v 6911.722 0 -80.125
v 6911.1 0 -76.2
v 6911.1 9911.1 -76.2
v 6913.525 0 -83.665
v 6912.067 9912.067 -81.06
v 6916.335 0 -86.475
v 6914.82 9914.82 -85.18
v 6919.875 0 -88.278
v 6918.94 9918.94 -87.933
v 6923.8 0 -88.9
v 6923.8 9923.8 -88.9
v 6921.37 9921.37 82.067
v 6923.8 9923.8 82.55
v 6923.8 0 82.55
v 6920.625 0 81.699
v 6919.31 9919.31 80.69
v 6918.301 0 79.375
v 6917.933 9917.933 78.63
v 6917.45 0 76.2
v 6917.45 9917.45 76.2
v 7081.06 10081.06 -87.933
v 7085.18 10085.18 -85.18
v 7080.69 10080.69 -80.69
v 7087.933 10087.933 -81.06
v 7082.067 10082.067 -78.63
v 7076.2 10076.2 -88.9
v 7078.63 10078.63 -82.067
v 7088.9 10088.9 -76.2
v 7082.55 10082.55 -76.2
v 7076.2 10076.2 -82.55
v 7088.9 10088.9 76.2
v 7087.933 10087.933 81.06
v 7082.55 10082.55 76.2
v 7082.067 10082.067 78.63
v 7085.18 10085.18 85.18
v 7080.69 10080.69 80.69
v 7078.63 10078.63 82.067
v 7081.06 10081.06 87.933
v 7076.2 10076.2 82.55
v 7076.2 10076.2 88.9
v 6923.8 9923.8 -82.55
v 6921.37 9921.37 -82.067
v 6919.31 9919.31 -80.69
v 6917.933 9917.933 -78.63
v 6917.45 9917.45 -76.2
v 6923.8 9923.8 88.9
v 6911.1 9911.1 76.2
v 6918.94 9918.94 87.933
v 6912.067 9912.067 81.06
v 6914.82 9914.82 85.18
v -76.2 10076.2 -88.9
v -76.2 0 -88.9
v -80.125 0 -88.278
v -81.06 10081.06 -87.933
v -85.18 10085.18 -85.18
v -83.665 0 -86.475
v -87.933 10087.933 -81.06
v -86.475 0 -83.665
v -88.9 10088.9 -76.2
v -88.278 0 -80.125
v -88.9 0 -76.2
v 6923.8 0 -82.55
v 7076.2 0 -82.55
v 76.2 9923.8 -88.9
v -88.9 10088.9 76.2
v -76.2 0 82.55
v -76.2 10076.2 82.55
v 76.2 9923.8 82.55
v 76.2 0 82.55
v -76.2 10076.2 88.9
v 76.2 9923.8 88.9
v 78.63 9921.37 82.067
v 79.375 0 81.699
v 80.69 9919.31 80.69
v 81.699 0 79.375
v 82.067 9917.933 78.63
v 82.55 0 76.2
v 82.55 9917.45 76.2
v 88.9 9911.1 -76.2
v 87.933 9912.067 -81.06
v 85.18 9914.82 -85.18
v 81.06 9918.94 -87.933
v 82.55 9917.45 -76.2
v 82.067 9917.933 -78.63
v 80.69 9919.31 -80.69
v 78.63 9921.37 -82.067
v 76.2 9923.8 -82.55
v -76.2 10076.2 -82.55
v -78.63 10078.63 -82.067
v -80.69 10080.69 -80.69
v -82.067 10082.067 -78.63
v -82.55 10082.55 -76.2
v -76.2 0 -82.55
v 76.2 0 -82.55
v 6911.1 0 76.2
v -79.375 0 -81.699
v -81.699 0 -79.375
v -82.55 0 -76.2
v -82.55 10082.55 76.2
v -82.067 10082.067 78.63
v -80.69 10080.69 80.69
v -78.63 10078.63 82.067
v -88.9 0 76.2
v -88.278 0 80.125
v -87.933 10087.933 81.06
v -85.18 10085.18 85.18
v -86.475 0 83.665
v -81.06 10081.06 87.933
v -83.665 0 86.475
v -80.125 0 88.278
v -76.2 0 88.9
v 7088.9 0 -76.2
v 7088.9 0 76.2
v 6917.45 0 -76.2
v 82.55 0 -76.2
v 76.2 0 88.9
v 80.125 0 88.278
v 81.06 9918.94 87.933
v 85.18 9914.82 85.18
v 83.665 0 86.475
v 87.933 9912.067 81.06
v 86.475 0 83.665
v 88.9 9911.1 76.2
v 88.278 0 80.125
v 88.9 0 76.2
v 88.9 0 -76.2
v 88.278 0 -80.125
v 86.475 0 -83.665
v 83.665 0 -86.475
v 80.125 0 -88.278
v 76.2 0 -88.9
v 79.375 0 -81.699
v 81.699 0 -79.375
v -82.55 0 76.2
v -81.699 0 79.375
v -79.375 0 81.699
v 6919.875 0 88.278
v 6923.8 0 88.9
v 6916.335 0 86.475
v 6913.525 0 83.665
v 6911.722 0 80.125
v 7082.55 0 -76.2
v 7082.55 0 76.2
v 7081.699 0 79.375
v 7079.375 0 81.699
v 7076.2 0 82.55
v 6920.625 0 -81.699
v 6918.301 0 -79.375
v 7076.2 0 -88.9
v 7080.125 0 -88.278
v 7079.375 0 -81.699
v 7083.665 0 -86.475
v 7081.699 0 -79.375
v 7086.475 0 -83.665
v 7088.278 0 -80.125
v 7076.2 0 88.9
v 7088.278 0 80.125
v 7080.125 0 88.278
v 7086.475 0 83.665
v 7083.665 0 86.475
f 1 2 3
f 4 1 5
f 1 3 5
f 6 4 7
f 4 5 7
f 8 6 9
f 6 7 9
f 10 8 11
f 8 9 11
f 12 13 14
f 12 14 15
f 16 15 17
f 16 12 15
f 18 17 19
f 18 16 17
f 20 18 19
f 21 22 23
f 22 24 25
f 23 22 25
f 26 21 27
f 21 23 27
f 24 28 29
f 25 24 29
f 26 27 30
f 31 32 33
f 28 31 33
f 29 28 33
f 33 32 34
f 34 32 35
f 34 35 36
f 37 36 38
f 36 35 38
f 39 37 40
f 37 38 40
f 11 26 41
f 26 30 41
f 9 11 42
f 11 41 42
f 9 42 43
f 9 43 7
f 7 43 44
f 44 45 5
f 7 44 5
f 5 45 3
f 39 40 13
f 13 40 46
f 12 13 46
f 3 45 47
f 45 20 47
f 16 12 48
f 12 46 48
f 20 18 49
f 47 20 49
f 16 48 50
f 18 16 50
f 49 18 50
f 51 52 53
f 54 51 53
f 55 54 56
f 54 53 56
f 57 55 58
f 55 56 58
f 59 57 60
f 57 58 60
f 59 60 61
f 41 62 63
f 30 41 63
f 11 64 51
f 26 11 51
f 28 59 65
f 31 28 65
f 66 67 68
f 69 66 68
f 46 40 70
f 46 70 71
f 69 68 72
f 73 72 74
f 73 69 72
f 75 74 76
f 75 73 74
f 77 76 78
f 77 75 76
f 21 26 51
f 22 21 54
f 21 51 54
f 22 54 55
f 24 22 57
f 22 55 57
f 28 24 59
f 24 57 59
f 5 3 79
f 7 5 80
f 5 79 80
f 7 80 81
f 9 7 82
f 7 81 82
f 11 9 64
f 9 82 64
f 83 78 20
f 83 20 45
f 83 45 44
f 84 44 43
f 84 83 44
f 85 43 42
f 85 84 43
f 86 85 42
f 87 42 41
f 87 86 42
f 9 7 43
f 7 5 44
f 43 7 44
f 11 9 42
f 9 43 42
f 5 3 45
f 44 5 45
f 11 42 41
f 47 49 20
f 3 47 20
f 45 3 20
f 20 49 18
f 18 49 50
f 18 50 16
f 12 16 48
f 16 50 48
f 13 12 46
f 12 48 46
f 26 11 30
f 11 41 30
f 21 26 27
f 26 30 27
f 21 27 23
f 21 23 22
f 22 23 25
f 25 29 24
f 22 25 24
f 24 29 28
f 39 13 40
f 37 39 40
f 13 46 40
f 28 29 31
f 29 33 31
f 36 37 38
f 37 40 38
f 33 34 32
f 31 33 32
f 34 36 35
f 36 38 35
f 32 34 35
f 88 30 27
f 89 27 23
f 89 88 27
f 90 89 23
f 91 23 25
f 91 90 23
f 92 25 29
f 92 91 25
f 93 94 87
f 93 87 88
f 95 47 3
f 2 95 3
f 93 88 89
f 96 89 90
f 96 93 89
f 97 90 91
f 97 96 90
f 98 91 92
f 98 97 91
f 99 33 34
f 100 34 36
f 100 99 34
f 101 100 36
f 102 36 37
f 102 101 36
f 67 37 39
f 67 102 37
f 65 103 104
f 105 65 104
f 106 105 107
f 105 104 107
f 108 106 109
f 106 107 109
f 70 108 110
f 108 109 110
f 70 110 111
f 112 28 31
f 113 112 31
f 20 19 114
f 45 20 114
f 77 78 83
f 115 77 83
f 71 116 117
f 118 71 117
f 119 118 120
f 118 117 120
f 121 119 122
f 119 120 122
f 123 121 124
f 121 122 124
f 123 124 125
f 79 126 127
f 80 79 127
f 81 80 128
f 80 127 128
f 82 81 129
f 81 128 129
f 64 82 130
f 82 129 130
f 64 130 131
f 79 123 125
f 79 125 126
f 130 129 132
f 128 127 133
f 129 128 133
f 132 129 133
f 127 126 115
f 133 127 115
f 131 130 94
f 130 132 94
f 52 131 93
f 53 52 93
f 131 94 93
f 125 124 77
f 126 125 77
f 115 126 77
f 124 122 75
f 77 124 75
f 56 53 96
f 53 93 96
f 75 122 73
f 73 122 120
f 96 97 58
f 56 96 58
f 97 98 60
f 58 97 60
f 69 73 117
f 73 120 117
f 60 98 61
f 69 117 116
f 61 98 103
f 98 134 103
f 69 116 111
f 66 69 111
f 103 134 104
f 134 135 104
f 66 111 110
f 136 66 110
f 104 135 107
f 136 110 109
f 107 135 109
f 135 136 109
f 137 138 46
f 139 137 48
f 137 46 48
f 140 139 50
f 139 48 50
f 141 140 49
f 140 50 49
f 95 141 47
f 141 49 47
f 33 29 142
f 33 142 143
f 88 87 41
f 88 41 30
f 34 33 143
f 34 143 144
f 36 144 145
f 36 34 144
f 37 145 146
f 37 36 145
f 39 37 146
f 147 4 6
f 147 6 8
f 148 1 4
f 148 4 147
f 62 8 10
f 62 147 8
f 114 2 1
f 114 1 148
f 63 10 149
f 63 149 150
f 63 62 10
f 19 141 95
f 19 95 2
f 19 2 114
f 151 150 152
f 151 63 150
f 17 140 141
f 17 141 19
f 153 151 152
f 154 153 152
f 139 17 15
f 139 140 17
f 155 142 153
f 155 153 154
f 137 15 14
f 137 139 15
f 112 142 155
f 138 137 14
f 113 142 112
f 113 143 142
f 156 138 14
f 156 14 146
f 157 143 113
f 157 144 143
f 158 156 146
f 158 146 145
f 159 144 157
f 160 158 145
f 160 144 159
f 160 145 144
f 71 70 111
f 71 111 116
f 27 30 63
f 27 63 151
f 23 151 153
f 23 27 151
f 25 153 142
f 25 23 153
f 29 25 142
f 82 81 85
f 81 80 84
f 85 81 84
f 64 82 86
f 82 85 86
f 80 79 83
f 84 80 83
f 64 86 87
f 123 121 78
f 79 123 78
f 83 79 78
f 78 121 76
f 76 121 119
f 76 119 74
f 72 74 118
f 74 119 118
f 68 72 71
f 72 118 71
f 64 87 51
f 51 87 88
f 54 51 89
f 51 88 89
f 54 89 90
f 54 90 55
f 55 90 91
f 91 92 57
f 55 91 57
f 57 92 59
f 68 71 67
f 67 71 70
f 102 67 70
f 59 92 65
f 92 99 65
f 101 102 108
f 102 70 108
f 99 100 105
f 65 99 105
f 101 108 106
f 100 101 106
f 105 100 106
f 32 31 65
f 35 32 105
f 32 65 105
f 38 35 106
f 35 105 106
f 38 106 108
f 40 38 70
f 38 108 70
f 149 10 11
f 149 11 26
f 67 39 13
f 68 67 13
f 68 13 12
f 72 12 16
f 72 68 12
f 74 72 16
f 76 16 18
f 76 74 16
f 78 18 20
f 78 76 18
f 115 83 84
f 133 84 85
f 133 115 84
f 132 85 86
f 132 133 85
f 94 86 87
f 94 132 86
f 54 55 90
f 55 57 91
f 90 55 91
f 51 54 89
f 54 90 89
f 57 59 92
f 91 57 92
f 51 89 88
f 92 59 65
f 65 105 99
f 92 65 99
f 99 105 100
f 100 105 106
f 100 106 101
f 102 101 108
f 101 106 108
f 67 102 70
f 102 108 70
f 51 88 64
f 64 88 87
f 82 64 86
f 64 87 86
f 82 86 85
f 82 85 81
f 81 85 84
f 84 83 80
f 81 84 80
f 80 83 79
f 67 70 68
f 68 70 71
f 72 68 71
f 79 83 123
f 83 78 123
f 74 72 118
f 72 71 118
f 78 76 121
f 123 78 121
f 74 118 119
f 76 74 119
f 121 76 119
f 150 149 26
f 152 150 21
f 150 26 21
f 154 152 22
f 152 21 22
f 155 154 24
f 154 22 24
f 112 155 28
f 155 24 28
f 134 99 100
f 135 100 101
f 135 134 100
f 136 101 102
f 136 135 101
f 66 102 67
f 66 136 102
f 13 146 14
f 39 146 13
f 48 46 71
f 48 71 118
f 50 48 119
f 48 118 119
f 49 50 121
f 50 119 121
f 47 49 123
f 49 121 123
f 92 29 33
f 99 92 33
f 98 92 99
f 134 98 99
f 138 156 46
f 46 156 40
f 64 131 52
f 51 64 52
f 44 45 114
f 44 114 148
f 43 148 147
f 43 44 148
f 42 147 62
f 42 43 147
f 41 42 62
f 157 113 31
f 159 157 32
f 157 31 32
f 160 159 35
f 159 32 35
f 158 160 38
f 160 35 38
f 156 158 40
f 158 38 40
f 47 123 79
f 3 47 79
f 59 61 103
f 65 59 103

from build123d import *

# Parameters (mm, degrees)
TUBE_SQUARE_TS7X7X0_25_1_DEPTH   = 10126.723585695
TUBE_SQUARE_TS7X7X0_25_1_2_DEPTH = 7253.44717139
TUBE_SQUARE_TS7X7X0_25_1_3_DEPTH = 10126.723585696


with BuildPart() as part:
    # Sketch11 → Tube square TS7X7X0.25(1) (new body)
    with BuildSketch(Plane(origin=(0, 0, 0), x_dir=(-1, 0, 0), z_dir=(0, 1, 0))):
        with BuildLine():
            Line((-76.2, -88.9), (76.2, -88.9))
            ThreePointArc((76.2, -88.9), (85.180256121, -85.180256121), (88.9, -76.2))
            Line((88.9, -76.2), (88.9, 76.2))
            ThreePointArc((88.9, 76.2), (85.180256121, 85.180256121), (76.2, 88.9))
            Line((76.2, 88.9), (-76.2, 88.9))
            ThreePointArc((-76.2, 88.9), (-85.180256121, 85.180256121), (-88.9, 76.2))
            Line((-88.9, 76.2), (-88.9, -76.2))
            ThreePointArc((-88.9, -76.2), (-85.180256121, -85.180256121), (-76.2, -88.9))
        make_face()
        with BuildLine():
            Line((-76.2, -82.55), (76.2, -82.55))
            ThreePointArc((76.2, -82.55), (80.690128061, -80.690128061), (82.55, -76.2))
            Line((82.55, -76.2), (82.55, 76.2))
            ThreePointArc((82.55, 76.2), (80.690128061, 80.690128061), (76.2, 82.55))
            Line((76.2, 82.55), (-76.2, 82.55))
            ThreePointArc((-76.2, 82.55), (-80.690128061, 80.690128061), (-82.55, 76.2))
            Line((-82.55, 76.2), (-82.55, -76.2))
            ThreePointArc((-82.55, -76.2), (-80.690128061, -80.690128061), (-76.2, -82.55))
        make_face(mode=Mode.SUBTRACT)
    extrude(amount=TUBE_SQUARE_TS7X7X0_25_1_DEPTH)

    # Tube square TS7X7X0.25(1) mitre 1
    split(bisect_by=Plane(origin=(0, 10000, 0), x_dir=(0.707106781, -0.707106781, 0), z_dir=(-0.707106781, -0.707106781, 0)), keep=Keep.TOP)


with BuildPart() as body_2:
    # Sketch11 on segment 2 (carried to segment 2) → Tube square TS7X7X0.25_1 2 (new body)
    with BuildSketch(Plane(origin=(-126.723585695, 10000, 0), x_dir=(0, 1, 0), z_dir=(1, 0, 0))):
        with BuildLine():
            Line((-76.2, -88.9), (76.2, -88.9))
            ThreePointArc((76.2, -88.9), (85.180256121, -85.180256121), (88.9, -76.2))
            Line((88.9, -76.2), (88.9, 76.2))
            ThreePointArc((88.9, 76.2), (85.180256121, 85.180256121), (76.2, 88.9))
            Line((76.2, 88.9), (-76.2, 88.9))
            ThreePointArc((-76.2, 88.9), (-85.180256121, 85.180256121), (-88.9, 76.2))
            Line((-88.9, 76.2), (-88.9, -76.2))
            ThreePointArc((-88.9, -76.2), (-85.180256121, -85.180256121), (-76.2, -88.9))
        make_face()
        with BuildLine():
            Line((-76.2, -82.55), (76.2, -82.55))
            ThreePointArc((76.2, -82.55), (80.690128061, -80.690128061), (82.55, -76.2))
            Line((82.55, -76.2), (82.55, 76.2))
            ThreePointArc((82.55, 76.2), (80.690128061, 80.690128061), (76.2, 82.55))
            Line((76.2, 82.55), (-76.2, 82.55))
            ThreePointArc((-76.2, 82.55), (-80.690128061, 80.690128061), (-82.55, 76.2))
            Line((-82.55, 76.2), (-82.55, -76.2))
            ThreePointArc((-82.55, -76.2), (-80.690128061, -80.690128061), (-76.2, -82.55))
        make_face(mode=Mode.SUBTRACT)
    extrude(amount=TUBE_SQUARE_TS7X7X0_25_1_2_DEPTH)

    # Tube square TS7X7X0.25_1 2 mitre 1
    split(bisect_by=Plane(origin=(0, 10000, 0), x_dir=(-0.707106781, 0.707106781, 0), z_dir=(0.707106781, 0.707106781, 0)), keep=Keep.TOP)

    # Tube square TS7X7X0.25_1 2 mitre 2
    split(bisect_by=Plane(origin=(7000, 10000, 0), x_dir=(-0.707106781, -0.707106781, 0), z_dir=(-0.707106781, 0.707106781, 0)), keep=Keep.TOP)


with BuildPart() as body_3:
    # Sketch11 on segment 3 (carried to segment 3) → Tube square TS7X7X0.25_1 3 (new body)
    with BuildSketch(Plane(origin=(7000, 10126.723585695, 0), x_dir=(1, 0, 0), z_dir=(0, -1, 0))):
        with BuildLine():
            Line((-76.2, -88.9), (76.2, -88.9))
            ThreePointArc((76.2, -88.9), (85.180256121, -85.180256121), (88.9, -76.2))
            Line((88.9, -76.2), (88.9, 76.2))
            ThreePointArc((88.9, 76.2), (85.180256121, 85.180256121), (76.2, 88.9))
            Line((76.2, 88.9), (-76.2, 88.9))
            ThreePointArc((-76.2, 88.9), (-85.180256121, 85.180256121), (-88.9, 76.2))
            Line((-88.9, 76.2), (-88.9, -76.2))
            ThreePointArc((-88.9, -76.2), (-85.180256121, -85.180256121), (-76.2, -88.9))
        make_face()
        with BuildLine():
            Line((-76.2, -82.55), (76.2, -82.55))
            ThreePointArc((76.2, -82.55), (80.690128061, -80.690128061), (82.55, -76.2))
            Line((82.55, -76.2), (82.55, 76.2))
            ThreePointArc((82.55, 76.2), (80.690128061, 80.690128061), (76.2, 82.55))
            Line((76.2, 82.55), (-76.2, 82.55))
            ThreePointArc((-76.2, 82.55), (-80.690128061, 80.690128061), (-82.55, 76.2))
            Line((-82.55, 76.2), (-82.55, -76.2))
            ThreePointArc((-82.55, -76.2), (-80.690128061, -80.690128061), (-76.2, -82.55))
        make_face(mode=Mode.SUBTRACT)
    extrude(amount=TUBE_SQUARE_TS7X7X0_25_1_3_DEPTH)

    # Tube square TS7X7X0.25_1 3 mitre 1
    split(bisect_by=Plane(origin=(7000, 10000, 0), x_dir=(0.707106781, 0.707106781, 0), z_dir=(0.707106781, -0.707106781, 0)), keep=Keep.TOP)


solid = Compound([part.part, body_2.part, body_3.part])
